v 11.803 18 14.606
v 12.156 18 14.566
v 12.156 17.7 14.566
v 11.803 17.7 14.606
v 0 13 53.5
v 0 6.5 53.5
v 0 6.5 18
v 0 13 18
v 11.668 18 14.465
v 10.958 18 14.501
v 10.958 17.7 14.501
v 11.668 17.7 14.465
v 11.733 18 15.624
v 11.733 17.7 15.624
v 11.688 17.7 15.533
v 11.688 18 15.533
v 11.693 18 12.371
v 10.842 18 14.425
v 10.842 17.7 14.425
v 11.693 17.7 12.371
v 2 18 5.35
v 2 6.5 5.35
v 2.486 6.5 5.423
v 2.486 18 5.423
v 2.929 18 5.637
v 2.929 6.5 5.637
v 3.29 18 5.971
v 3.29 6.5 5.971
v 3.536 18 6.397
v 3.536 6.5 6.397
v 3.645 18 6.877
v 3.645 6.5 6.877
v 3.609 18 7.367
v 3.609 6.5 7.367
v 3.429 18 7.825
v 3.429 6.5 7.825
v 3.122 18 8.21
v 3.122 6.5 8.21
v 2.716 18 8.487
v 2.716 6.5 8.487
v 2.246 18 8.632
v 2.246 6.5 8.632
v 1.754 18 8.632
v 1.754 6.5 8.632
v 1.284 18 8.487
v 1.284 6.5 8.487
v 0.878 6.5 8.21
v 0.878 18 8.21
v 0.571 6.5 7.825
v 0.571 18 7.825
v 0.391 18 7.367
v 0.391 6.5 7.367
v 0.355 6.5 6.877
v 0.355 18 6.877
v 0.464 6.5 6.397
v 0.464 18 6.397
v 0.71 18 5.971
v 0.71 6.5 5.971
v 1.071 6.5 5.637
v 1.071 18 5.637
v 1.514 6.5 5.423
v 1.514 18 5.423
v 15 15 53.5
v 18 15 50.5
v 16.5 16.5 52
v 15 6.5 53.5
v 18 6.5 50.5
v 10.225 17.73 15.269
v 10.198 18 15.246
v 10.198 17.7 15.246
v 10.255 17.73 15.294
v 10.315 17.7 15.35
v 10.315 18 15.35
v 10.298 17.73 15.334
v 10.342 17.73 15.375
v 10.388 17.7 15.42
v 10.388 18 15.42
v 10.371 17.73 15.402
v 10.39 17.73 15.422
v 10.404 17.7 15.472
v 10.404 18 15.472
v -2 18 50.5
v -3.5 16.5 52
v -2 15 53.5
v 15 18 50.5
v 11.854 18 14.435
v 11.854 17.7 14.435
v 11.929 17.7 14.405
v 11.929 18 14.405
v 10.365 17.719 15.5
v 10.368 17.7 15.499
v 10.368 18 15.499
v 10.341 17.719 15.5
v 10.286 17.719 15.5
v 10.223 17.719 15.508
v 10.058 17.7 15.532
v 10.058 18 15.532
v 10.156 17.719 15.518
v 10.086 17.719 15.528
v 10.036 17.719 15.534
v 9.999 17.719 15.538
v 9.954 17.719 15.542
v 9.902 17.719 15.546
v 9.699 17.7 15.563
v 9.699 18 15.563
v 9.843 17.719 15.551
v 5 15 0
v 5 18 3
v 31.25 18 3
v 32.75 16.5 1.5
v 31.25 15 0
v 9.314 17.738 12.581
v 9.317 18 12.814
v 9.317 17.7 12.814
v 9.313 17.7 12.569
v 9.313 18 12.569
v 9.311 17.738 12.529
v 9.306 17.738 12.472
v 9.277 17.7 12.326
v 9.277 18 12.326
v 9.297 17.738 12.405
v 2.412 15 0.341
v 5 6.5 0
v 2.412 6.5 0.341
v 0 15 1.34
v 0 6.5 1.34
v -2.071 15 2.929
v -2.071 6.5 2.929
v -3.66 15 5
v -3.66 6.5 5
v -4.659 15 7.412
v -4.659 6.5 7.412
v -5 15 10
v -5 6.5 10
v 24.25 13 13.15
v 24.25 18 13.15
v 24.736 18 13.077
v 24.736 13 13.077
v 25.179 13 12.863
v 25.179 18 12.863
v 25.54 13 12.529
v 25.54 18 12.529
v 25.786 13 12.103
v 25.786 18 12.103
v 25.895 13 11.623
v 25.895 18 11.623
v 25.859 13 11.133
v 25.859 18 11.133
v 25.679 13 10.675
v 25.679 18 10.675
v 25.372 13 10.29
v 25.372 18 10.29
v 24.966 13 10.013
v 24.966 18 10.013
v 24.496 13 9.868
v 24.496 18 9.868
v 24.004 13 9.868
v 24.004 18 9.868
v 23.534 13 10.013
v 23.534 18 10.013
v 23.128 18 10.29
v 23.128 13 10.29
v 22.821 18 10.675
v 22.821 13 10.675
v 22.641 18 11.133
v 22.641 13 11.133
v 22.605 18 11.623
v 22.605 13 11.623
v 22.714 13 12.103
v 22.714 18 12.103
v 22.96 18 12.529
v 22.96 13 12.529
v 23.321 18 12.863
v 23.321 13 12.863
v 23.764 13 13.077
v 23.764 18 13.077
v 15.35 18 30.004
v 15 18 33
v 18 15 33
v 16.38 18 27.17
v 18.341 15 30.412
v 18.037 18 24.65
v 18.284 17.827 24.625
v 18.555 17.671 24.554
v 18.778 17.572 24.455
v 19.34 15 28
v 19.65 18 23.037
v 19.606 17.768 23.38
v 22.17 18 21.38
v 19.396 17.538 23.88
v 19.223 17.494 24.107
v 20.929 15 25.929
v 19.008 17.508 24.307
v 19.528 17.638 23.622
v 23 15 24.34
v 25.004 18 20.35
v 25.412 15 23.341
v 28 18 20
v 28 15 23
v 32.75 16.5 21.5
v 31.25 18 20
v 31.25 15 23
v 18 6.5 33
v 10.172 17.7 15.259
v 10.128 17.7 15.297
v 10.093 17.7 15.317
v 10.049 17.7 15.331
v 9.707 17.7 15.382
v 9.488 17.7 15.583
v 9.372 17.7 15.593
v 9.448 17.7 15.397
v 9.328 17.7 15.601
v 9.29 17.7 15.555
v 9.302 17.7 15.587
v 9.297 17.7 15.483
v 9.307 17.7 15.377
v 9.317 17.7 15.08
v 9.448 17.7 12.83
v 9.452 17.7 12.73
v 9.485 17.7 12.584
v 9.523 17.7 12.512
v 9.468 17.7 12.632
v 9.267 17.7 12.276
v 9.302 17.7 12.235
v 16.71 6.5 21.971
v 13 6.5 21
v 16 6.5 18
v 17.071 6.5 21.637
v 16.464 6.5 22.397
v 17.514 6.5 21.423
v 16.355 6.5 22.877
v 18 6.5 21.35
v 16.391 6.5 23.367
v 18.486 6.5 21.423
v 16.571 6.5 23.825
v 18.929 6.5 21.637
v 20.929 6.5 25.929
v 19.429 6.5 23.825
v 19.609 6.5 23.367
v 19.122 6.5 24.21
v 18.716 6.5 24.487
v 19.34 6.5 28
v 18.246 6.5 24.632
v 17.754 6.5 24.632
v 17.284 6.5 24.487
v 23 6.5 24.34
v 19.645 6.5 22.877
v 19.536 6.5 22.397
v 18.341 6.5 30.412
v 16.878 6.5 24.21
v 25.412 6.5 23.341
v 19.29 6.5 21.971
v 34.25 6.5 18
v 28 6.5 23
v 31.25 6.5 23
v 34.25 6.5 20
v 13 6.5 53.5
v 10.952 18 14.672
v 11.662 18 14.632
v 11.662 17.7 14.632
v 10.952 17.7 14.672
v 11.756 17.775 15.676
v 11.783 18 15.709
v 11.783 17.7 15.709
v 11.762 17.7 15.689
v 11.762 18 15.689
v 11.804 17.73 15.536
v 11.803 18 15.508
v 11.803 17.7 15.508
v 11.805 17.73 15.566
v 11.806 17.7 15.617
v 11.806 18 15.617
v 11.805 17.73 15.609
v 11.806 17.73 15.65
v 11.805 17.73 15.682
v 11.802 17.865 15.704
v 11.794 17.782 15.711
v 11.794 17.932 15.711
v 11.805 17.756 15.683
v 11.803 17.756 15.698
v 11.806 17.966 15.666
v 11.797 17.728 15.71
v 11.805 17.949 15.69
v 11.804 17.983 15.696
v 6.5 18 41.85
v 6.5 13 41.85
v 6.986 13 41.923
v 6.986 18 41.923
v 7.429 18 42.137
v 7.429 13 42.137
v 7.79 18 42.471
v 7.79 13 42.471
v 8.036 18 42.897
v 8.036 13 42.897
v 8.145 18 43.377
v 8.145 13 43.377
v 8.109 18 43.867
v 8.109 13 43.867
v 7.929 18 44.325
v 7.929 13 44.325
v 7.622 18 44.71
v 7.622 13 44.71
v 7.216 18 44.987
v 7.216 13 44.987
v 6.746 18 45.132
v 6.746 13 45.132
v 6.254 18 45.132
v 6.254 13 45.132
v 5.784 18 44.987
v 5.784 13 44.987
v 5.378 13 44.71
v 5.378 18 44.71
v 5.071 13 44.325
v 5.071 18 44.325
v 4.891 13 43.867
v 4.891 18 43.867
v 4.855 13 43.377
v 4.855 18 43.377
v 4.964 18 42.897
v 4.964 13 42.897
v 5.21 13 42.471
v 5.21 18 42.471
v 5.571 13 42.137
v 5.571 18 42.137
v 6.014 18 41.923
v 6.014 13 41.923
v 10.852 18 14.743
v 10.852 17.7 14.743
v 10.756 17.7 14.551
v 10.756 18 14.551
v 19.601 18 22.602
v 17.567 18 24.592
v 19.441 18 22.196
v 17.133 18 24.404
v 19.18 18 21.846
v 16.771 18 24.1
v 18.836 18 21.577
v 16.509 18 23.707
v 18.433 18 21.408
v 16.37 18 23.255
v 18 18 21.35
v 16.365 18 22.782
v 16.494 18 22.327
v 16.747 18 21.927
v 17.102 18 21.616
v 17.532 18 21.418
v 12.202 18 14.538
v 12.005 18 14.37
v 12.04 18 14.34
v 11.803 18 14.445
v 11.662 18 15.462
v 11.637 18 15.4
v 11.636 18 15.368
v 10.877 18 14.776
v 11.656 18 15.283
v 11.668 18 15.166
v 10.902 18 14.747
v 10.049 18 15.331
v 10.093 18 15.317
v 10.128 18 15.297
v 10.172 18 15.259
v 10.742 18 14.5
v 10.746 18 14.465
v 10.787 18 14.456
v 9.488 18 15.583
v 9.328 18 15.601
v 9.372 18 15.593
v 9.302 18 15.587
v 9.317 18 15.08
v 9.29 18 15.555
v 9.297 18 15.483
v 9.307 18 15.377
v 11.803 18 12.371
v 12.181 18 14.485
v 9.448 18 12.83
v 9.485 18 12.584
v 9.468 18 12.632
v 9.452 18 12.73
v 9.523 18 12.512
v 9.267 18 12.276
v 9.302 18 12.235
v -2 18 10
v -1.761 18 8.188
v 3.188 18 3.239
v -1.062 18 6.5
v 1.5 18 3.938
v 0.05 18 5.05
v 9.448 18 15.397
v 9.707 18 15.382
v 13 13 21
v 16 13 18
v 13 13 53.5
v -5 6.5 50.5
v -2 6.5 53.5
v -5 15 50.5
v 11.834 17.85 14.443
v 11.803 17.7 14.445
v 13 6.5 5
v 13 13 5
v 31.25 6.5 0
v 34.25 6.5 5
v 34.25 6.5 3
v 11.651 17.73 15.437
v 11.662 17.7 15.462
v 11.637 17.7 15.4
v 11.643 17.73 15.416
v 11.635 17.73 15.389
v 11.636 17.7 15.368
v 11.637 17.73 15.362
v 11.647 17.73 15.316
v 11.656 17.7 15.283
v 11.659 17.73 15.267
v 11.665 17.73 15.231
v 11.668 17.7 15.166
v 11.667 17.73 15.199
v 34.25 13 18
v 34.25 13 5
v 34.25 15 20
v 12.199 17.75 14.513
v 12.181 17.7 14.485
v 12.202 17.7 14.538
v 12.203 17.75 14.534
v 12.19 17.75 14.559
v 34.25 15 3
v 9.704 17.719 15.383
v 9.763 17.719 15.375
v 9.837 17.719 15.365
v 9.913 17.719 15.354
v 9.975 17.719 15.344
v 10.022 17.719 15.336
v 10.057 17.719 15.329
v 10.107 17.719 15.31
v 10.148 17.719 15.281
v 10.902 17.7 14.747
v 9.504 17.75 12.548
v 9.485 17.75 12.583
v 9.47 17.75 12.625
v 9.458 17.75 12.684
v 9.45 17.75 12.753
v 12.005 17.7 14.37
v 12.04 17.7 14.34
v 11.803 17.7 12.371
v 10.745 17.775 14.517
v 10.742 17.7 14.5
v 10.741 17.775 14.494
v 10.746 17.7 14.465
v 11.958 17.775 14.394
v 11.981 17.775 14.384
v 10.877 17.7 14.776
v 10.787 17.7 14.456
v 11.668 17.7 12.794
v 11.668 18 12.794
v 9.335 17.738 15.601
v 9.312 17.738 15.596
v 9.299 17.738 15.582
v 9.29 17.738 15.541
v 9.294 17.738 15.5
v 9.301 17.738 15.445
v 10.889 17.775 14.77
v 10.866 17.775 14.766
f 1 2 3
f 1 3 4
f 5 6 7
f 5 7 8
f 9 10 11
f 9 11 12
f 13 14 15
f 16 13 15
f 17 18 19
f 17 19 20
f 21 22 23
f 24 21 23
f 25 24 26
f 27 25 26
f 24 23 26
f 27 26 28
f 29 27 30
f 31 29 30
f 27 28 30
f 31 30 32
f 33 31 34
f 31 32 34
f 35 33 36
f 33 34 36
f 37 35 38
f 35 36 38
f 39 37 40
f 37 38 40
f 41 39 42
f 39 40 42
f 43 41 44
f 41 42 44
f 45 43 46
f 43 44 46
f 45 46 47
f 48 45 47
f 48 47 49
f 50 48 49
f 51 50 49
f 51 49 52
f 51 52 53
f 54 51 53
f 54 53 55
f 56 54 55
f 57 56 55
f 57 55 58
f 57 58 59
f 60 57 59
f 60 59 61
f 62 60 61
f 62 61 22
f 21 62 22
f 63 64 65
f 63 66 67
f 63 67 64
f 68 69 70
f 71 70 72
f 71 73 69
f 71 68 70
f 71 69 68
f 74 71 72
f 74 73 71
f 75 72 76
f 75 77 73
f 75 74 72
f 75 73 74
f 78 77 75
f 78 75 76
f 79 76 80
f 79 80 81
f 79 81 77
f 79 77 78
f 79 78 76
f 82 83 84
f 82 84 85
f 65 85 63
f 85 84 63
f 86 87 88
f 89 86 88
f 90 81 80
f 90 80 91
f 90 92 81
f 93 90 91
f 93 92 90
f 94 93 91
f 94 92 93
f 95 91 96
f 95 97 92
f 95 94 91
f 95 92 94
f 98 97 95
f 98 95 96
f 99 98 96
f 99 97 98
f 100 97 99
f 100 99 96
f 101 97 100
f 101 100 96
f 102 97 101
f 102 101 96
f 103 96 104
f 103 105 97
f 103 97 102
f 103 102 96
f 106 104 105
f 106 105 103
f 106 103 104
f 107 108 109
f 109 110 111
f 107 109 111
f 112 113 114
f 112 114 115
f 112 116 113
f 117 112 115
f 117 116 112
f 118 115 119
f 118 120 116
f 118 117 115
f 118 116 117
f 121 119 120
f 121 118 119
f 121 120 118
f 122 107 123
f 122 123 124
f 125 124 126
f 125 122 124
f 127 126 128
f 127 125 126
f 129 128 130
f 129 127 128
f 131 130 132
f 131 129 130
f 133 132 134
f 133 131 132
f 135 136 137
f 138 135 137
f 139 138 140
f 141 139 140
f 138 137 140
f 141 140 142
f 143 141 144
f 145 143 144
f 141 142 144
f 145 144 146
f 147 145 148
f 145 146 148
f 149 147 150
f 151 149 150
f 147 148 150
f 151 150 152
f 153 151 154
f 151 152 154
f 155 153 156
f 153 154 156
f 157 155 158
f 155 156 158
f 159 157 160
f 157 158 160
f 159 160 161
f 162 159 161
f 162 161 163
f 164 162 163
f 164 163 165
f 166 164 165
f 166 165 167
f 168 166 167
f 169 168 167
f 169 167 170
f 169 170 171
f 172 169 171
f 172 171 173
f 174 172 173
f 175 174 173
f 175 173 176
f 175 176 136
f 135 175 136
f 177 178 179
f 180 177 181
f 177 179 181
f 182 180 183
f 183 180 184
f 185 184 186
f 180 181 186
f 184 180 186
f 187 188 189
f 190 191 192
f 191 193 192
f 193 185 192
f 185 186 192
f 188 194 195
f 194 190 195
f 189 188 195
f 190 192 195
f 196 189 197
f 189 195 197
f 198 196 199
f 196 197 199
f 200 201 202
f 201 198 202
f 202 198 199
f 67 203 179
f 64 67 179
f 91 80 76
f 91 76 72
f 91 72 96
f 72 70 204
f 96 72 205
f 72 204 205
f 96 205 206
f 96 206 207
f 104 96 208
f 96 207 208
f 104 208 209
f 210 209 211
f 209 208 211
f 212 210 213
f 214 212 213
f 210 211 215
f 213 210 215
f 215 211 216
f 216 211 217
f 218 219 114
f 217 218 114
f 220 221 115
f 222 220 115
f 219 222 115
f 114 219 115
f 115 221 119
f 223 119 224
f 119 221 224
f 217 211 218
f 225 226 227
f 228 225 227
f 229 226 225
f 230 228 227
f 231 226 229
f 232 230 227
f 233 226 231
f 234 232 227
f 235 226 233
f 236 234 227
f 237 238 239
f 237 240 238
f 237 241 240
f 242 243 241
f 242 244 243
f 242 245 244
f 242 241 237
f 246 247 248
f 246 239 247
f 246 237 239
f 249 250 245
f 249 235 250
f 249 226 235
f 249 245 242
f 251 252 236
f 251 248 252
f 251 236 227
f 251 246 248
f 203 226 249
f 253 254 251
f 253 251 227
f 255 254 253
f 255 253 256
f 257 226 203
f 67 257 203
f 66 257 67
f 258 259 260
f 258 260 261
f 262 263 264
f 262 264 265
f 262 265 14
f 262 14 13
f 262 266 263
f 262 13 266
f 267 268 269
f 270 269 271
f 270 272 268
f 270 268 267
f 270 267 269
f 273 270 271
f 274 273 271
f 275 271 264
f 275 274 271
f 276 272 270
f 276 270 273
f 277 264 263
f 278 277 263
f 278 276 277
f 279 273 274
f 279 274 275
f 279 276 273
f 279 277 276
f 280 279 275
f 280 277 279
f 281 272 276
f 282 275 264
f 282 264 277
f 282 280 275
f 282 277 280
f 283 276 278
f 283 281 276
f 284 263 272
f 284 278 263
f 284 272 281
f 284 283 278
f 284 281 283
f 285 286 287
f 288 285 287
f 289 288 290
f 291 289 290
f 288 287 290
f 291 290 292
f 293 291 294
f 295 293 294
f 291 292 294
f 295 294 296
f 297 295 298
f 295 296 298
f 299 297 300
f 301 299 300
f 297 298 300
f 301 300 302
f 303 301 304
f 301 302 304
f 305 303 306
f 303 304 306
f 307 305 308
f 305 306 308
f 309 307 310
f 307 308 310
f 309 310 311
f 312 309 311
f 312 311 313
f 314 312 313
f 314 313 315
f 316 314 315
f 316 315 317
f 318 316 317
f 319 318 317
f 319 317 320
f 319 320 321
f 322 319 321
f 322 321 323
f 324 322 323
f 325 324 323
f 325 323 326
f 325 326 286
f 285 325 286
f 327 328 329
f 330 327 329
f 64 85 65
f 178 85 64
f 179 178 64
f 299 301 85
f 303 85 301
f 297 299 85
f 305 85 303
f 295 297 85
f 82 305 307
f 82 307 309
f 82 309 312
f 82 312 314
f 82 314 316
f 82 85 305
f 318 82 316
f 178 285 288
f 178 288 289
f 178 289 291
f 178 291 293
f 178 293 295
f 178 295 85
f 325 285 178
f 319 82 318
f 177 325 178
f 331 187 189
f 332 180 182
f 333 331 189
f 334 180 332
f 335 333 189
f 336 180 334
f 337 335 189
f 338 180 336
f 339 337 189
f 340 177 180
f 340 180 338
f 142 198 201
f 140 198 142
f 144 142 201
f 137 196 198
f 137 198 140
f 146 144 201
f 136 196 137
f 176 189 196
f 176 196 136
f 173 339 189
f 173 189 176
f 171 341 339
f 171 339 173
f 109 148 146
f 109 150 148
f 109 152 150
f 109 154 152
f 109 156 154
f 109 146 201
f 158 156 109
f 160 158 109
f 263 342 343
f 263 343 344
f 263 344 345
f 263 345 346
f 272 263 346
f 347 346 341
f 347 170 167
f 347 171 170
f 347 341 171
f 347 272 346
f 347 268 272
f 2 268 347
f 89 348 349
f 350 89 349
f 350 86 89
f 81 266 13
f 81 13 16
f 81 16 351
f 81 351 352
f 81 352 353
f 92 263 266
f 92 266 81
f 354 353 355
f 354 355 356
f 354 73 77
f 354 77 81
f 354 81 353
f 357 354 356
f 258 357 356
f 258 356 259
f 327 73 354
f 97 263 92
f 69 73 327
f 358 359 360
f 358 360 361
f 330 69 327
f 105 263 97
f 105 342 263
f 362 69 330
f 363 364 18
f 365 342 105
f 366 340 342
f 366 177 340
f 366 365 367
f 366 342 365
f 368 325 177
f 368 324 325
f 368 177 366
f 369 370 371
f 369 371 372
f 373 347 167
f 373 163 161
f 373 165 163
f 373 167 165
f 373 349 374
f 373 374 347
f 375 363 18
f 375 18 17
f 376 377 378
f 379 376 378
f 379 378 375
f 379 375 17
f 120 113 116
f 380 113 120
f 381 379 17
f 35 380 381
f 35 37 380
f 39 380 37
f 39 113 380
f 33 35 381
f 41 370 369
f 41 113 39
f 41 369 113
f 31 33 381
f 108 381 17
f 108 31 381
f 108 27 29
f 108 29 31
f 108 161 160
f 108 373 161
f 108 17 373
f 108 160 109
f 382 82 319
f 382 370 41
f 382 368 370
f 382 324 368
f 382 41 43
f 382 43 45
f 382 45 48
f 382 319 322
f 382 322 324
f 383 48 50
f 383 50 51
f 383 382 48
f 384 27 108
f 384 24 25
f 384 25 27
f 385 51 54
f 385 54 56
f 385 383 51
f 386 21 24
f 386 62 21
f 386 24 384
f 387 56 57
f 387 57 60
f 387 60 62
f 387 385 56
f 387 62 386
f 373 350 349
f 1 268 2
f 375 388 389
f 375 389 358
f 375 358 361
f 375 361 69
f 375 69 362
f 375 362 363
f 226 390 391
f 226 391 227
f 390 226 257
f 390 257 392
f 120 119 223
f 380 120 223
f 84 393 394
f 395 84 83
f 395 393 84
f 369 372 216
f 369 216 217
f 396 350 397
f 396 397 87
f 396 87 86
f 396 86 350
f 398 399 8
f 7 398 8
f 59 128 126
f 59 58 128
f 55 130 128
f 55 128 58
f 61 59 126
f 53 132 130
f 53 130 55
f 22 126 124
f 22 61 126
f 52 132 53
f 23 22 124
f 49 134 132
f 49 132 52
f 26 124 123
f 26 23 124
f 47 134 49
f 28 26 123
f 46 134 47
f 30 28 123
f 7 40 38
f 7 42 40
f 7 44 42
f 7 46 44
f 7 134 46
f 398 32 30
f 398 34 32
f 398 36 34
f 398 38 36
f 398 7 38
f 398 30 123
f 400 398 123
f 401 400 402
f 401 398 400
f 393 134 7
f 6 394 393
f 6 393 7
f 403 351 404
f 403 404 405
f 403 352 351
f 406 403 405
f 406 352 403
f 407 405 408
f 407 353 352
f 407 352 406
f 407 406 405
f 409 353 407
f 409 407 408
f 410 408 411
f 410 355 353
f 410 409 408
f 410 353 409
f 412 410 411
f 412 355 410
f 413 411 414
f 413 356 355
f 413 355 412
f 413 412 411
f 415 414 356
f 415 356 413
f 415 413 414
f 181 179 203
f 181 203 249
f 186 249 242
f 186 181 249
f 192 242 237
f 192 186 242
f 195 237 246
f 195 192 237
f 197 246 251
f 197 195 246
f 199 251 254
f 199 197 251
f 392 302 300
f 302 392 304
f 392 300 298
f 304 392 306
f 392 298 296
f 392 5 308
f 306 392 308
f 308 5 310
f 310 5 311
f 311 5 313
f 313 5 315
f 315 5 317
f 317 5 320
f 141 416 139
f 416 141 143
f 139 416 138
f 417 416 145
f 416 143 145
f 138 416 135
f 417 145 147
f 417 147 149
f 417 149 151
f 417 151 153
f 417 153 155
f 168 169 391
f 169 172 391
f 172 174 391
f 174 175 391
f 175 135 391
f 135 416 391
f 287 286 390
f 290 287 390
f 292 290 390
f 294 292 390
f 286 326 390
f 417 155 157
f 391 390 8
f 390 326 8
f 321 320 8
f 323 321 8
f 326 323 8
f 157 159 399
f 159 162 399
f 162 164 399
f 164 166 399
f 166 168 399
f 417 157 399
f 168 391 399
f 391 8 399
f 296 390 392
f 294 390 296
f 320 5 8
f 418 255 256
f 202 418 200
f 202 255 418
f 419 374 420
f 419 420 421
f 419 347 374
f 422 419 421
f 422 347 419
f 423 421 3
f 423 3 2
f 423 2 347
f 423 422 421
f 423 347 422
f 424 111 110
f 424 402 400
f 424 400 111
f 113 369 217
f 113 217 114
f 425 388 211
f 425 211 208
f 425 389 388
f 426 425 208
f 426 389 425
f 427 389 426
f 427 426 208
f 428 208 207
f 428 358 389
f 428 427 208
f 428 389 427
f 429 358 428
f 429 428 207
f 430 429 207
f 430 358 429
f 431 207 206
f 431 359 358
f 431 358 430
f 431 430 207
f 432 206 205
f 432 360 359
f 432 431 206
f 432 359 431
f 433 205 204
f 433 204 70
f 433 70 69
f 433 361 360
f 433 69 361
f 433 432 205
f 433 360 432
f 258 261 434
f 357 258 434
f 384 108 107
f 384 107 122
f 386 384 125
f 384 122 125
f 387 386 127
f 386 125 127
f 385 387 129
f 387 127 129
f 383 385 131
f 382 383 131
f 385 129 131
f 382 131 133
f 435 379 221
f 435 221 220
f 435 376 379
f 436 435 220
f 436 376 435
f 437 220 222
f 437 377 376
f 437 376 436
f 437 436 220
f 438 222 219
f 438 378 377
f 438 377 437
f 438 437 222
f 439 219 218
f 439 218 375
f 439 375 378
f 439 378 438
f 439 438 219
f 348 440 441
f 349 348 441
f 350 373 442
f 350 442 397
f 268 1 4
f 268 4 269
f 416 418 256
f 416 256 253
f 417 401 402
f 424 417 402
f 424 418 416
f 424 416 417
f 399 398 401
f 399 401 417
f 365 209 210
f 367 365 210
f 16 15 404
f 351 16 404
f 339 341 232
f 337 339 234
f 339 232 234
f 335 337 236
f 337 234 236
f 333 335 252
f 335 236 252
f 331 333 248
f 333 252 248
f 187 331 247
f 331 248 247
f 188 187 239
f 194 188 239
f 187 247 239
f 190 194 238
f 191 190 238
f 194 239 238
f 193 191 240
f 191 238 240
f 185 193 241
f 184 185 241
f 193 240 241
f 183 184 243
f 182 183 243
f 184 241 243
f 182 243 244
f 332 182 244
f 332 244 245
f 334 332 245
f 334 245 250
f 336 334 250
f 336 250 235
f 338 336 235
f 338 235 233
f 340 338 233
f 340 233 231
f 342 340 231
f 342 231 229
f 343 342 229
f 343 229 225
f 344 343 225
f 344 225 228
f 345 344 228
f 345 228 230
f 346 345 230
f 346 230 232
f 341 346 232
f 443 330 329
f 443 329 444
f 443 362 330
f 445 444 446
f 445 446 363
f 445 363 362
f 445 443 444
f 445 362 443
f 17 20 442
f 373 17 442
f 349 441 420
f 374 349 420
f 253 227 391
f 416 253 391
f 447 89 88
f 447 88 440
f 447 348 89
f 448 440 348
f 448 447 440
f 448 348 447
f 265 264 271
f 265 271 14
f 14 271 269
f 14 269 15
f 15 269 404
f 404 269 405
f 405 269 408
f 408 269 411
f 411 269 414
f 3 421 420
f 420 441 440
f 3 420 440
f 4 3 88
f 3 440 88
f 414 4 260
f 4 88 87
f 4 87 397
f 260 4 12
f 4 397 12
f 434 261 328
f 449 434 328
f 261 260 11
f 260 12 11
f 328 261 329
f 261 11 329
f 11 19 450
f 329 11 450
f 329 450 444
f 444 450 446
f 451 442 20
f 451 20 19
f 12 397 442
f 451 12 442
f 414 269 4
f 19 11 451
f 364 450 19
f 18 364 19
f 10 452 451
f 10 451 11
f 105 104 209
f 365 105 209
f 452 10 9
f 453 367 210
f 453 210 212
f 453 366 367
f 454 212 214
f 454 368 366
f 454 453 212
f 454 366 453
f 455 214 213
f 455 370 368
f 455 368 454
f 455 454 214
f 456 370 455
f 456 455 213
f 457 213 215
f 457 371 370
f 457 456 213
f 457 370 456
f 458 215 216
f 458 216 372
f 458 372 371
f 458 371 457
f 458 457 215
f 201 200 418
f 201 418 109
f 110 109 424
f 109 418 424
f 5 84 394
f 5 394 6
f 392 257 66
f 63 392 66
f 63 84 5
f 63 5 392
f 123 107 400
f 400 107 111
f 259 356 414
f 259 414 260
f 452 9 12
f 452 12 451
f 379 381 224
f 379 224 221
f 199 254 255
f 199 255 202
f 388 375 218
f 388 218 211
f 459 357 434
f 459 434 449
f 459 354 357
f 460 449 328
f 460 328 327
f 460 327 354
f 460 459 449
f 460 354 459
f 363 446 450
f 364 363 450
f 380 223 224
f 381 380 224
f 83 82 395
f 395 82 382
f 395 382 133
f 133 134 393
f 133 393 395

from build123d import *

# Parameters (mm, degrees)
SKETCH_1_W          = 23
SKETCH_1_H          = 23
SKETCH_1_W_2        = 13
SKETCH_1_H_2        = 13
EXTRUDE_1_DEPTH     = 53.5
SKETCH_2_R          = 1.65
CUT_EXTRUDE_1_DEPTH = 34
SKETCH_4_W          = 23
SKETCH_4_H          = 23
SKETCH_4_R          = 3
EXTRUDE_2_DEPTH     = 6.25
SKETCH_5_W          = 23
SKETCH_5_H          = 23
SKETCH_5_W_2        = 13
SKETCH_5_H_2        = 13
EXTRUDE_1_2_DEPTH   = 10
SKETCH_6_R          = 1.65
CUT_EXTRUDE_2_DEPTH = 39
SKETCH_7_W          = 13
SKETCH_7_H          = 13
CUT_EXTRUDE_3_DEPTH = 15.75
CHAMFER_1_SIZE      = 3
SKETCH_8_W          = 39.25
SKETCH_8_H          = 53.5
CUT_EXTRUDE_4_DEPTH = 11.5
EXTRUDE_3_DEPTH     = 6.5
FILLET_1_R          = 10
FILLET_2_R          = 10
SKETCH_10_R         = 1.65
CUT_EXTRUDE_5_DEPTH = 28.5
CHAMFER_3_SIZE      = 3
CHAMFER_4_SIZE      = 3
CHAMFER_5_SIZE      = 3
CUT_EXTRUDE_6_DEPTH = 0.3


with BuildPart() as part:
    # 草图1 → Extrude 1 (new body)
    with BuildSketch(Plane.XY):
        with Locations((6.5, 6.5)):
            Rectangle(SKETCH_1_W, SKETCH_1_H)
        with Locations((6.5, 6.5)):
            Rectangle(SKETCH_1_W_2, SKETCH_1_H_2, mode=Mode.SUBTRACT)
    extrude(amount=EXTRUDE_1_DEPTH)

    # 草图2 → 切除-拉伸1 (cut)
    with BuildSketch(Plane.XZ.offset(5)):
        with Locations(Location((6.5, 43.5, 0), (0, 0, 270))):
            Circle(SKETCH_2_R)
    extrude(amount=-CUT_EXTRUDE_1_DEPTH, mode=Mode.SUBTRACT)

    # 草图4 → 凸台-拉伸2 (add)
    with BuildSketch(Plane(origin=(18, 0, 0), x_dir=(0, 0, -1), z_dir=(1, 0, 0))):
        with Locations((-11.5, 6.5)):
            Rectangle(SKETCH_4_W, SKETCH_4_H)
        with Locations(Location((-11.5, 6.5, 0), (0, 0, 90))):
            Circle(SKETCH_4_R, mode=Mode.SUBTRACT)
    extrude(amount=EXTRUDE_2_DEPTH)

    # 草图5 → Extrude 1 2 (add)
    with BuildSketch(Plane(origin=(24.25, 0, 0), x_dir=(0, 0, -1), z_dir=(1, 0, 0))):
        with Locations((-11.5, 6.5)):
            Rectangle(SKETCH_5_W, SKETCH_5_H)
        with Locations((-11.5, 6.5)):
            Rectangle(SKETCH_5_W_2, SKETCH_5_H_2, mode=Mode.SUBTRACT)
    extrude(amount=EXTRUDE_1_2_DEPTH)

    # 草图6 → 切除-拉伸2 (cut)
    with BuildSketch(Plane(origin=(0, 18, 0), x_dir=(1, 0, 0), z_dir=(0, 1, 0))):
        with Locations(Location((24.25, -11.5, 0), (0, 0, 270))):
            Circle(SKETCH_6_R)
    extrude(amount=-CUT_EXTRUDE_2_DEPTH, mode=Mode.SUBTRACT)

    # 草图7 → 切除-拉伸3 (cut)
    with BuildSketch(Plane(origin=(24.25, 0, 0), x_dir=(0, 0, -1), z_dir=(1, 0, 0))):
        with Locations((-11.5, 6.5)):
            Rectangle(SKETCH_7_W, SKETCH_7_H)
    extrude(amount=-CUT_EXTRUDE_3_DEPTH, mode=Mode.SUBTRACT)

    # 倒角1
    chamfer_1_edges = [part.edges().sort_by_distance(p)[0] for p in [
        (13, 6.5, 18),
    ]]
    chamfer(chamfer_1_edges, length=CHAMFER_1_SIZE)

    # 草图8 → 切除-拉伸4 (cut)
    with BuildSketch(Plane.XZ.offset(5)):
        with Locations((14.625, 26.75)):
            Rectangle(SKETCH_8_W, SKETCH_8_H)
    extrude(amount=-CUT_EXTRUDE_4_DEPTH, mode=Mode.SUBTRACT)

    # 草图9 → 凸台-拉伸3 (add)
    with BuildSketch(Plane.XZ.offset(-13)):
        Polygon((13, 5), (0, 18), (0, 0), (13, 0), align=None)
    extrude(amount=EXTRUDE_3_DEPTH)

    # 圆角1
    fillet_1_edges = [part.edges().sort_by_distance(p)[0] for p in [
        (-5, 12.25, 0),
    ]]
    fillet(fillet_1_edges, radius=FILLET_1_R)

    # 圆角2
    fillet_2_edges = [part.edges().sort_by_distance(p)[0] for p in [
        (18, 12.25, 23),
    ]]
    fillet(fillet_2_edges, radius=FILLET_2_R)

    # 草图10 → 切除-拉伸5 (cut)
    with BuildSketch(Plane.XZ.offset(-6.5)):
        with Locations(Location((2, 7, 0), (0, 0, 270))):
            Circle(SKETCH_10_R)
        with Locations(Location((18, 23, 0), (0, 0, 270))):
            Circle(SKETCH_10_R)
    extrude(amount=-CUT_EXTRUDE_5_DEPTH, mode=Mode.SUBTRACT)

    # 倒角3
    # the kernel refuses this chamfer: 3 mm, written as the material it takes off along each edge
    with BuildSketch(Plane(origin=(5, 18, 10), x_dir=(0, 0, -1), z_dir=(1, 0, 0))) as chamfer_3_piece_1:
        Polygon((10 - CHAMFER_3_SIZE, 0), (10, -CHAMFER_3_SIZE), (10, 0), align=None)
    revolve(axis=Axis((5, 18, 10), (0, 1, 0)), revolution_arc=90, mode=Mode.SUBTRACT)
    with BuildSketch(Plane(origin=(28, 18, 33), x_dir=(-1, 0, 0), z_dir=(0, 0, 1))) as chamfer_3_piece_2:
        Polygon((10 + CHAMFER_3_SIZE, 0), (10, CHAMFER_3_SIZE), (10, 0), align=None)
    revolve(axis=Axis((28, 18, 33), (0, -1, 0)), revolution_arc=90, mode=Mode.SUBTRACT)
    with BuildSketch(Plane(origin=(28, 18, 23), x_dir=(0, 0.027495876610586768, -0.9996219169112968), z_dir=(1, 0, 0))) as chamfer_3_piece_3:
        Polygon((CHAMFER_3_SIZE * 0.999621916911, -CHAMFER_3_SIZE * 0.0274958766106), (-CHAMFER_3_SIZE * 0.0274958766106, -CHAMFER_3_SIZE * 0.999621916911), (0, 0), align=None)
    extrude(amount=13.965048964, mode=Mode.SUBTRACT)
    with BuildSketch(Plane(origin=(41.965048964, 18, 0), x_dir=(0, 0.027495876610586778, 0.9996219169112968), z_dir=(-1, 0, 0))) as chamfer_3_piece_4:
        Polygon((CHAMFER_3_SIZE * 0.999621916911, -CHAMFER_3_SIZE * 0.0274958766106), (-CHAMFER_3_SIZE * 0.0274958766106, -CHAMFER_3_SIZE * 0.999621916911), (0, 0), align=None)
    extrude(amount=36.965048964, mode=Mode.SUBTRACT)
    with BuildSketch(Plane(origin=(-5, 18, 10), x_dir=(0.9996219169112968, 0.027495876610586778, 0), z_dir=(0, 0, 1))) as chamfer_3_piece_5:
        Polygon((CHAMFER_3_SIZE * 0.999621916911, -CHAMFER_3_SIZE * 0.0274958766106), (-CHAMFER_3_SIZE * 0.0274958766106, -CHAMFER_3_SIZE * 0.999621916911), (0, 0), align=None)
    extrude(amount=51.215048964, mode=Mode.SUBTRACT)
    with BuildSketch(Plane(origin=(18, 18, 33), x_dir=(-0.9996219169112968, 0.02749587661058678, 0), z_dir=(0, 0, 1))) as chamfer_3_piece_6:
        Polygon((CHAMFER_3_SIZE * 0.999621916911, CHAMFER_3_SIZE * 0.0274958766106), (-CHAMFER_3_SIZE * 0.0274958766106, CHAMFER_3_SIZE * 0.999621916911), (0, 0), align=None)
    extrude(amount=28.215048964, mode=Mode.SUBTRACT)

    # 倒角4
    chamfer_4_edges = [part.edges().sort_by_distance(p)[0] for p in [
        (34.25, 18, 11.5),
        (6.5, 18, 53.5),
    ]]
    chamfer(chamfer_4_edges, length=CHAMFER_4_SIZE)

    # 倒角5
    chamfer_5_edges = [part.edges().sort_by_distance(p)[0] for p in [
        (34.25, 10.75, 0),
        (18, 10.75, 53.5),
        (-5, 10.75, 53.5),
        (34.25, 10.75, 23),
    ]]
    chamfer(chamfer_5_edges, length=CHAMFER_5_SIZE)

    # 草图11 → 切除-拉伸6 (cut)
    # profile 1 of 2: a face of its own
    with BuildSketch(Plane(origin=(0, 18, 0), x_dir=(1, 0, 0), z_dir=(0, 1, 0))):
        with BuildLine():
            Line((9.266813218, -12.275683704), (9.301865424, -12.235410958))
            Line((9.301865424, -12.235410958), (9.52336553, -12.512099643))
            add(Edge.make_bspline(
                [(9.52336553, -12.512099643), (9.516963751, -12.524061704), (9.504318984, -12.547689117), (9.483420652, -12.58408966), (9.467037494, -12.629648361), (9.4564399, -12.686951648), (9.44894746, -12.755283372), (9.448352464, -12.804177447), (9.448040578, -12.829806867)],
                knots=[0, 0, 0, 0, 0.736410598, 1.454555069, 2.274010016, 3.348139226, 4.609940921, 6, 6, 6, 6], degree=3))
            Line((9.448040578, -12.829806867), (9.448040578, -15.396821569))
            add(Edge.make_bspline(
                [(9.448040578, -15.396821569), (9.468678125, -15.397042087), (9.506479393, -15.397446004), (9.557158846, -15.395009259), (9.596750153, -15.395226891), (9.629094922, -15.392529476), (9.663579716, -15.387912913), (9.708300118, -15.381986855), (9.768057065, -15.374741756), (9.837632832, -15.364777769), (9.908227888, -15.354286785), (9.969922175, -15.344844322), (10.017878618, -15.336418923), (10.062989469, -15.328613359), (10.107288304, -15.313240575), (10.146161972, -15.284882643), (10.171155498, -15.256112424), (10.190610238, -15.248788426), (10.197561141, -15.246171665)],
                knots=[0, 0, 0, 0, 1.271684107, 2.329311289, 3.126176351, 3.710204741, 4.32783396, 5.270448411, 6.49050515, 8.03759688, 9.602040843, 10.889228832, 11.884182716, 12.602334394, 13.712376462, 14.732953672, 15.547302315, 16, 16, 16, 16], degree=3))
            add(Edge.make_bspline(
                [(10.197561141, -15.246171665), (10.200811265, -15.24863479), (10.210252218, -15.255789669), (10.229119367, -15.272044232), (10.26040013, -15.297821919), (10.298329787, -15.334573391), (10.337260708, -15.37059091), (10.368228435, -15.399211988), (10.390470603, -15.419627911), (10.399083222, -15.440767903), (10.402676117, -15.45784931), (10.403710075, -15.467910384), (10.404145415, -15.472146521)],
                knots=[0, 0, 0, 0, 0.390394386, 1.134016561, 2.38360509, 4.269889804, 6.18981564, 7.453157385, 8.329021544, 9.032311711, 9.592562279, 10, 10, 10, 10], degree=3))
            add(Edge.make_bspline(
                [(10.404145415, -15.472146521), (10.40206375, -15.476942394), (10.397878443, -15.486584772), (10.383090877, -15.495937469), (10.363982572, -15.500904408), (10.33073977, -15.500343625), (10.283110462, -15.498769522), (10.22132921, -15.508356201), (10.15501695, -15.517554008), (10.102379022, -15.525784834), (10.062387506, -15.531592767), (10.033223518, -15.534164422), (9.996494325, -15.53828724), (9.951932173, -15.541590229), (9.899741162, -15.546219376), (9.839824995, -15.551393941), (9.772242849, -15.557543502), (9.724485896, -15.561206741), (9.699372349, -15.563133097)],
                knots=[0, 0, 0, 0, 0.341365878, 0.68633572, 1.116730632, 1.647491765, 2.890856209, 4.29325764, 5.800779701, 7.359923239, 7.845242571, 8.495183841, 9.311733456, 10.309872826, 11.474601469, 12.805924266, 14.320358265, 16, 16, 16, 16], degree=3))
            Line((9.699372349, -15.563133097), (9.488313325, -15.58326947))
            Line((9.488313325, -15.58326947), (9.371969835, -15.592964761))
            add(Edge.make_bspline(
                [(9.371969835, -15.592964761), (9.359859022, -15.596910851), (9.340230241, -15.603306534), (9.311283529, -15.599186231), (9.298718203, -15.582428084), (9.288983167, -15.564046832), (9.289718075, -15.535389642), (9.295112786, -15.4956315), (9.302089302, -15.440906027), (9.305306038, -15.399562146), (9.307085965, -15.376685196)],
                knots=[0, 0, 0, 0, 1.058270145, 1.715207142, 2.242218181, 2.723015089, 3.427046488, 4.550153686, 6.091084828, 8, 8, 8, 8], degree=3))
            Line((9.307085965, -15.376685196), (9.316781256, -15.079860137))
            Line((9.316781256, -15.079860137), (9.316781256, -12.814145243))
            add(Edge.make_bspline(
                [(9.316781256, -12.814145243), (9.316886855, -12.786052717), (9.317076564, -12.735584232), (9.315973066, -12.66871921), (9.315772104, -12.618974802), (9.313508673, -12.574485109), (9.310800273, -12.527231104), (9.306709072, -12.46863647), (9.297355447, -12.400354092), (9.283895077, -12.352602109), (9.276508509, -12.326397533)],
                knots=[0, 0, 0, 0, 1.372323329, 2.465391677, 3.267017655, 3.801925377, 4.641299591, 5.579257235, 6.671583216, 8, 8, 8, 8], degree=3))
            Line((9.276508509, -12.326397533), (9.266813218, -12.275683704))
        make_face()
    # profile 2 of 2: a face of its own
    with BuildSketch(Plane(origin=(0, 18, 0), x_dir=(1, 0, 0), z_dir=(0, 1, 0))):
        with BuildLine():
            Line((11.662295852, -14.631639383), (10.952302245, -14.67191213))
            Line((10.952302245, -14.67191213), (10.902334207, -14.747237082))
            add(Edge.make_bspline(
                [(10.902334207, -14.747237082), (10.89907351, -14.755130581), (10.894145585, -14.767060104), (10.875925797, -14.779362904), (10.862257335, -14.761715586), (10.855798411, -14.750206879), (10.851620378, -14.742762332)],
                knots=[0, 0, 0, 0, 1.282902353, 1.938863145, 2.666728425, 4, 4, 4, 4], degree=3))
            Line((10.851620378, -14.742762332), (10.756159053, -14.55109389))
            add(Edge.make_bspline(
                [(10.756159053, -14.55109389), (10.752075263, -14.539775538), (10.745341137, -14.521111693), (10.740438443, -14.496060274), (10.741832408, -14.478391928), (10.74506786, -14.4692654), (10.746463762, -14.465327855)],
                knots=[0, 0, 0, 0, 1.63130738, 2.690008936, 3.434818089, 4, 4, 4, 4], degree=3))
            Line((10.746463762, -14.465327855), (10.786736508, -14.455632564))
            Line((10.786736508, -14.455632564), (10.841925087, -14.425055109))
            Line((10.841925087, -14.425055109), (11.692873308, -12.37114503))
            Line((11.692873308, -12.37114503), (11.803250465, -12.37114503))
            Line((11.803250465, -12.37114503), (11.803250465, -14.445191482))
            add(Edge.make_bspline(
                [(11.803250465, -14.445191482), (11.813622011, -14.445270114), (11.831257584, -14.445403819), (11.847340005, -14.43838657), (11.853964295, -14.435496191)],
                knots=[0, 0, 0, 0, 1.176207474, 2, 2, 2, 2], degree=3))
            Line((11.853964295, -14.435496191), (11.929289247, -14.404918735))
            add(Edge.make_bspline(
                [(11.929289247, -14.404918735), (11.939026891, -14.401284394), (11.956383934, -14.394806297), (11.978733372, -14.385077379), (11.994554633, -14.377586554), (12.001926587, -14.371929086), (12.004614199, -14.36986653)],
                knots=[0, 0, 0, 0, 1.495147538, 2.665053038, 3.513315187, 4, 4, 4, 4], degree=3))
            Line((12.004614199, -14.36986653), (12.039666404, -14.340034866))
            Line((12.039666404, -14.340034866), (12.180621017, -14.485464229))
            add(Edge.make_bspline(
                [(12.180621017, -14.485464229), (12.187801764, -14.494105754), (12.199556354, -14.508251578), (12.204686736, -14.532190552), (12.199794163, -14.548379765), (12.19064813, -14.560038294), (12.174705658, -14.564925245), (12.162970778, -14.565605945), (12.156009894, -14.566009722)],
                knots=[0, 0, 0, 0, 1.690587597, 2.767423091, 3.557953073, 4.202677464, 4.933866242, 6, 6, 6, 6], degree=3))
            Line((12.156009894, -14.566009722), (11.803250465, -14.606282468))
            Line((11.803250465, -14.606282468), (11.803250465, -15.507944518))
            add(Edge.make_bspline(
                [(11.803250465, -15.507944518), (11.803232512, -15.510679439), (11.803172094, -15.519883497), (11.80433053, -15.539259214), (11.80480027, -15.570089271), (11.805404744, -15.608399492), (11.806439968, -15.6468409), (11.8061055, -15.67797641), (11.804087339, -15.697610778), (11.799340663, -15.710229116), (11.790049194, -15.712488517), (11.785280059, -15.71030151), (11.783114092, -15.709308252)],
                knots=[0, 0, 0, 0, 0.375701713, 1.264380521, 2.665139726, 4.612257271, 6.525225464, 7.960129458, 8.858599367, 9.286556546, 9.675980055, 10, 10, 10, 10], degree=3))
            add(Edge.make_bspline(
                [(11.783114092, -15.709308252), (11.778903236, -15.706805374), (11.766209459, -15.699260359), (11.755084299, -15.674911777), (11.741716695, -15.649639385), (11.735707323, -15.631341151), (11.733146055, -15.623542217)],
                knots=[0, 0, 0, 0, 0.572299195, 1.725216547, 3.030459198, 4, 4, 4, 4], degree=3))
            Line((11.733146055, -15.623542217), (11.687652767, -15.532555641))
            Line((11.687652767, -15.532555641), (11.662295852, -15.46245123))
            add(Edge.make_bspline(
                [(11.662295852, -15.46245123), (11.658439784, -15.454050251), (11.651462153, -15.438848513), (11.643818588, -15.417893938), (11.636994063, -15.402423867), (11.633195029, -15.384019199), (11.63765141, -15.355267833), (11.647473016, -15.315004179), (11.659268246, -15.271961287), (11.664810088, -15.232629705), (11.66708518, -15.198722696), (11.667370597, -15.176816345), (11.667516393, -15.165626172)],
                knots=[0, 0, 0, 0, 0.908031708, 1.643101311, 2.192199313, 2.565975908, 3.473020803, 5.002279505, 6.661670863, 7.846934984, 8.900174221, 10, 10, 10, 10], degree=3))
            Line((11.667516393, -15.165626172), (11.662295852, -14.631639383))
        make_face()
        Polygon((11.667516393, -14.465327855), (11.667516393, -12.79400887), (10.957522786, -14.501125852), align=None, mode=Mode.SUBTRACT)
    extrude(amount=-CUT_EXTRUDE_6_DEPTH, mode=Mode.SUBTRACT)


solid = part.part
